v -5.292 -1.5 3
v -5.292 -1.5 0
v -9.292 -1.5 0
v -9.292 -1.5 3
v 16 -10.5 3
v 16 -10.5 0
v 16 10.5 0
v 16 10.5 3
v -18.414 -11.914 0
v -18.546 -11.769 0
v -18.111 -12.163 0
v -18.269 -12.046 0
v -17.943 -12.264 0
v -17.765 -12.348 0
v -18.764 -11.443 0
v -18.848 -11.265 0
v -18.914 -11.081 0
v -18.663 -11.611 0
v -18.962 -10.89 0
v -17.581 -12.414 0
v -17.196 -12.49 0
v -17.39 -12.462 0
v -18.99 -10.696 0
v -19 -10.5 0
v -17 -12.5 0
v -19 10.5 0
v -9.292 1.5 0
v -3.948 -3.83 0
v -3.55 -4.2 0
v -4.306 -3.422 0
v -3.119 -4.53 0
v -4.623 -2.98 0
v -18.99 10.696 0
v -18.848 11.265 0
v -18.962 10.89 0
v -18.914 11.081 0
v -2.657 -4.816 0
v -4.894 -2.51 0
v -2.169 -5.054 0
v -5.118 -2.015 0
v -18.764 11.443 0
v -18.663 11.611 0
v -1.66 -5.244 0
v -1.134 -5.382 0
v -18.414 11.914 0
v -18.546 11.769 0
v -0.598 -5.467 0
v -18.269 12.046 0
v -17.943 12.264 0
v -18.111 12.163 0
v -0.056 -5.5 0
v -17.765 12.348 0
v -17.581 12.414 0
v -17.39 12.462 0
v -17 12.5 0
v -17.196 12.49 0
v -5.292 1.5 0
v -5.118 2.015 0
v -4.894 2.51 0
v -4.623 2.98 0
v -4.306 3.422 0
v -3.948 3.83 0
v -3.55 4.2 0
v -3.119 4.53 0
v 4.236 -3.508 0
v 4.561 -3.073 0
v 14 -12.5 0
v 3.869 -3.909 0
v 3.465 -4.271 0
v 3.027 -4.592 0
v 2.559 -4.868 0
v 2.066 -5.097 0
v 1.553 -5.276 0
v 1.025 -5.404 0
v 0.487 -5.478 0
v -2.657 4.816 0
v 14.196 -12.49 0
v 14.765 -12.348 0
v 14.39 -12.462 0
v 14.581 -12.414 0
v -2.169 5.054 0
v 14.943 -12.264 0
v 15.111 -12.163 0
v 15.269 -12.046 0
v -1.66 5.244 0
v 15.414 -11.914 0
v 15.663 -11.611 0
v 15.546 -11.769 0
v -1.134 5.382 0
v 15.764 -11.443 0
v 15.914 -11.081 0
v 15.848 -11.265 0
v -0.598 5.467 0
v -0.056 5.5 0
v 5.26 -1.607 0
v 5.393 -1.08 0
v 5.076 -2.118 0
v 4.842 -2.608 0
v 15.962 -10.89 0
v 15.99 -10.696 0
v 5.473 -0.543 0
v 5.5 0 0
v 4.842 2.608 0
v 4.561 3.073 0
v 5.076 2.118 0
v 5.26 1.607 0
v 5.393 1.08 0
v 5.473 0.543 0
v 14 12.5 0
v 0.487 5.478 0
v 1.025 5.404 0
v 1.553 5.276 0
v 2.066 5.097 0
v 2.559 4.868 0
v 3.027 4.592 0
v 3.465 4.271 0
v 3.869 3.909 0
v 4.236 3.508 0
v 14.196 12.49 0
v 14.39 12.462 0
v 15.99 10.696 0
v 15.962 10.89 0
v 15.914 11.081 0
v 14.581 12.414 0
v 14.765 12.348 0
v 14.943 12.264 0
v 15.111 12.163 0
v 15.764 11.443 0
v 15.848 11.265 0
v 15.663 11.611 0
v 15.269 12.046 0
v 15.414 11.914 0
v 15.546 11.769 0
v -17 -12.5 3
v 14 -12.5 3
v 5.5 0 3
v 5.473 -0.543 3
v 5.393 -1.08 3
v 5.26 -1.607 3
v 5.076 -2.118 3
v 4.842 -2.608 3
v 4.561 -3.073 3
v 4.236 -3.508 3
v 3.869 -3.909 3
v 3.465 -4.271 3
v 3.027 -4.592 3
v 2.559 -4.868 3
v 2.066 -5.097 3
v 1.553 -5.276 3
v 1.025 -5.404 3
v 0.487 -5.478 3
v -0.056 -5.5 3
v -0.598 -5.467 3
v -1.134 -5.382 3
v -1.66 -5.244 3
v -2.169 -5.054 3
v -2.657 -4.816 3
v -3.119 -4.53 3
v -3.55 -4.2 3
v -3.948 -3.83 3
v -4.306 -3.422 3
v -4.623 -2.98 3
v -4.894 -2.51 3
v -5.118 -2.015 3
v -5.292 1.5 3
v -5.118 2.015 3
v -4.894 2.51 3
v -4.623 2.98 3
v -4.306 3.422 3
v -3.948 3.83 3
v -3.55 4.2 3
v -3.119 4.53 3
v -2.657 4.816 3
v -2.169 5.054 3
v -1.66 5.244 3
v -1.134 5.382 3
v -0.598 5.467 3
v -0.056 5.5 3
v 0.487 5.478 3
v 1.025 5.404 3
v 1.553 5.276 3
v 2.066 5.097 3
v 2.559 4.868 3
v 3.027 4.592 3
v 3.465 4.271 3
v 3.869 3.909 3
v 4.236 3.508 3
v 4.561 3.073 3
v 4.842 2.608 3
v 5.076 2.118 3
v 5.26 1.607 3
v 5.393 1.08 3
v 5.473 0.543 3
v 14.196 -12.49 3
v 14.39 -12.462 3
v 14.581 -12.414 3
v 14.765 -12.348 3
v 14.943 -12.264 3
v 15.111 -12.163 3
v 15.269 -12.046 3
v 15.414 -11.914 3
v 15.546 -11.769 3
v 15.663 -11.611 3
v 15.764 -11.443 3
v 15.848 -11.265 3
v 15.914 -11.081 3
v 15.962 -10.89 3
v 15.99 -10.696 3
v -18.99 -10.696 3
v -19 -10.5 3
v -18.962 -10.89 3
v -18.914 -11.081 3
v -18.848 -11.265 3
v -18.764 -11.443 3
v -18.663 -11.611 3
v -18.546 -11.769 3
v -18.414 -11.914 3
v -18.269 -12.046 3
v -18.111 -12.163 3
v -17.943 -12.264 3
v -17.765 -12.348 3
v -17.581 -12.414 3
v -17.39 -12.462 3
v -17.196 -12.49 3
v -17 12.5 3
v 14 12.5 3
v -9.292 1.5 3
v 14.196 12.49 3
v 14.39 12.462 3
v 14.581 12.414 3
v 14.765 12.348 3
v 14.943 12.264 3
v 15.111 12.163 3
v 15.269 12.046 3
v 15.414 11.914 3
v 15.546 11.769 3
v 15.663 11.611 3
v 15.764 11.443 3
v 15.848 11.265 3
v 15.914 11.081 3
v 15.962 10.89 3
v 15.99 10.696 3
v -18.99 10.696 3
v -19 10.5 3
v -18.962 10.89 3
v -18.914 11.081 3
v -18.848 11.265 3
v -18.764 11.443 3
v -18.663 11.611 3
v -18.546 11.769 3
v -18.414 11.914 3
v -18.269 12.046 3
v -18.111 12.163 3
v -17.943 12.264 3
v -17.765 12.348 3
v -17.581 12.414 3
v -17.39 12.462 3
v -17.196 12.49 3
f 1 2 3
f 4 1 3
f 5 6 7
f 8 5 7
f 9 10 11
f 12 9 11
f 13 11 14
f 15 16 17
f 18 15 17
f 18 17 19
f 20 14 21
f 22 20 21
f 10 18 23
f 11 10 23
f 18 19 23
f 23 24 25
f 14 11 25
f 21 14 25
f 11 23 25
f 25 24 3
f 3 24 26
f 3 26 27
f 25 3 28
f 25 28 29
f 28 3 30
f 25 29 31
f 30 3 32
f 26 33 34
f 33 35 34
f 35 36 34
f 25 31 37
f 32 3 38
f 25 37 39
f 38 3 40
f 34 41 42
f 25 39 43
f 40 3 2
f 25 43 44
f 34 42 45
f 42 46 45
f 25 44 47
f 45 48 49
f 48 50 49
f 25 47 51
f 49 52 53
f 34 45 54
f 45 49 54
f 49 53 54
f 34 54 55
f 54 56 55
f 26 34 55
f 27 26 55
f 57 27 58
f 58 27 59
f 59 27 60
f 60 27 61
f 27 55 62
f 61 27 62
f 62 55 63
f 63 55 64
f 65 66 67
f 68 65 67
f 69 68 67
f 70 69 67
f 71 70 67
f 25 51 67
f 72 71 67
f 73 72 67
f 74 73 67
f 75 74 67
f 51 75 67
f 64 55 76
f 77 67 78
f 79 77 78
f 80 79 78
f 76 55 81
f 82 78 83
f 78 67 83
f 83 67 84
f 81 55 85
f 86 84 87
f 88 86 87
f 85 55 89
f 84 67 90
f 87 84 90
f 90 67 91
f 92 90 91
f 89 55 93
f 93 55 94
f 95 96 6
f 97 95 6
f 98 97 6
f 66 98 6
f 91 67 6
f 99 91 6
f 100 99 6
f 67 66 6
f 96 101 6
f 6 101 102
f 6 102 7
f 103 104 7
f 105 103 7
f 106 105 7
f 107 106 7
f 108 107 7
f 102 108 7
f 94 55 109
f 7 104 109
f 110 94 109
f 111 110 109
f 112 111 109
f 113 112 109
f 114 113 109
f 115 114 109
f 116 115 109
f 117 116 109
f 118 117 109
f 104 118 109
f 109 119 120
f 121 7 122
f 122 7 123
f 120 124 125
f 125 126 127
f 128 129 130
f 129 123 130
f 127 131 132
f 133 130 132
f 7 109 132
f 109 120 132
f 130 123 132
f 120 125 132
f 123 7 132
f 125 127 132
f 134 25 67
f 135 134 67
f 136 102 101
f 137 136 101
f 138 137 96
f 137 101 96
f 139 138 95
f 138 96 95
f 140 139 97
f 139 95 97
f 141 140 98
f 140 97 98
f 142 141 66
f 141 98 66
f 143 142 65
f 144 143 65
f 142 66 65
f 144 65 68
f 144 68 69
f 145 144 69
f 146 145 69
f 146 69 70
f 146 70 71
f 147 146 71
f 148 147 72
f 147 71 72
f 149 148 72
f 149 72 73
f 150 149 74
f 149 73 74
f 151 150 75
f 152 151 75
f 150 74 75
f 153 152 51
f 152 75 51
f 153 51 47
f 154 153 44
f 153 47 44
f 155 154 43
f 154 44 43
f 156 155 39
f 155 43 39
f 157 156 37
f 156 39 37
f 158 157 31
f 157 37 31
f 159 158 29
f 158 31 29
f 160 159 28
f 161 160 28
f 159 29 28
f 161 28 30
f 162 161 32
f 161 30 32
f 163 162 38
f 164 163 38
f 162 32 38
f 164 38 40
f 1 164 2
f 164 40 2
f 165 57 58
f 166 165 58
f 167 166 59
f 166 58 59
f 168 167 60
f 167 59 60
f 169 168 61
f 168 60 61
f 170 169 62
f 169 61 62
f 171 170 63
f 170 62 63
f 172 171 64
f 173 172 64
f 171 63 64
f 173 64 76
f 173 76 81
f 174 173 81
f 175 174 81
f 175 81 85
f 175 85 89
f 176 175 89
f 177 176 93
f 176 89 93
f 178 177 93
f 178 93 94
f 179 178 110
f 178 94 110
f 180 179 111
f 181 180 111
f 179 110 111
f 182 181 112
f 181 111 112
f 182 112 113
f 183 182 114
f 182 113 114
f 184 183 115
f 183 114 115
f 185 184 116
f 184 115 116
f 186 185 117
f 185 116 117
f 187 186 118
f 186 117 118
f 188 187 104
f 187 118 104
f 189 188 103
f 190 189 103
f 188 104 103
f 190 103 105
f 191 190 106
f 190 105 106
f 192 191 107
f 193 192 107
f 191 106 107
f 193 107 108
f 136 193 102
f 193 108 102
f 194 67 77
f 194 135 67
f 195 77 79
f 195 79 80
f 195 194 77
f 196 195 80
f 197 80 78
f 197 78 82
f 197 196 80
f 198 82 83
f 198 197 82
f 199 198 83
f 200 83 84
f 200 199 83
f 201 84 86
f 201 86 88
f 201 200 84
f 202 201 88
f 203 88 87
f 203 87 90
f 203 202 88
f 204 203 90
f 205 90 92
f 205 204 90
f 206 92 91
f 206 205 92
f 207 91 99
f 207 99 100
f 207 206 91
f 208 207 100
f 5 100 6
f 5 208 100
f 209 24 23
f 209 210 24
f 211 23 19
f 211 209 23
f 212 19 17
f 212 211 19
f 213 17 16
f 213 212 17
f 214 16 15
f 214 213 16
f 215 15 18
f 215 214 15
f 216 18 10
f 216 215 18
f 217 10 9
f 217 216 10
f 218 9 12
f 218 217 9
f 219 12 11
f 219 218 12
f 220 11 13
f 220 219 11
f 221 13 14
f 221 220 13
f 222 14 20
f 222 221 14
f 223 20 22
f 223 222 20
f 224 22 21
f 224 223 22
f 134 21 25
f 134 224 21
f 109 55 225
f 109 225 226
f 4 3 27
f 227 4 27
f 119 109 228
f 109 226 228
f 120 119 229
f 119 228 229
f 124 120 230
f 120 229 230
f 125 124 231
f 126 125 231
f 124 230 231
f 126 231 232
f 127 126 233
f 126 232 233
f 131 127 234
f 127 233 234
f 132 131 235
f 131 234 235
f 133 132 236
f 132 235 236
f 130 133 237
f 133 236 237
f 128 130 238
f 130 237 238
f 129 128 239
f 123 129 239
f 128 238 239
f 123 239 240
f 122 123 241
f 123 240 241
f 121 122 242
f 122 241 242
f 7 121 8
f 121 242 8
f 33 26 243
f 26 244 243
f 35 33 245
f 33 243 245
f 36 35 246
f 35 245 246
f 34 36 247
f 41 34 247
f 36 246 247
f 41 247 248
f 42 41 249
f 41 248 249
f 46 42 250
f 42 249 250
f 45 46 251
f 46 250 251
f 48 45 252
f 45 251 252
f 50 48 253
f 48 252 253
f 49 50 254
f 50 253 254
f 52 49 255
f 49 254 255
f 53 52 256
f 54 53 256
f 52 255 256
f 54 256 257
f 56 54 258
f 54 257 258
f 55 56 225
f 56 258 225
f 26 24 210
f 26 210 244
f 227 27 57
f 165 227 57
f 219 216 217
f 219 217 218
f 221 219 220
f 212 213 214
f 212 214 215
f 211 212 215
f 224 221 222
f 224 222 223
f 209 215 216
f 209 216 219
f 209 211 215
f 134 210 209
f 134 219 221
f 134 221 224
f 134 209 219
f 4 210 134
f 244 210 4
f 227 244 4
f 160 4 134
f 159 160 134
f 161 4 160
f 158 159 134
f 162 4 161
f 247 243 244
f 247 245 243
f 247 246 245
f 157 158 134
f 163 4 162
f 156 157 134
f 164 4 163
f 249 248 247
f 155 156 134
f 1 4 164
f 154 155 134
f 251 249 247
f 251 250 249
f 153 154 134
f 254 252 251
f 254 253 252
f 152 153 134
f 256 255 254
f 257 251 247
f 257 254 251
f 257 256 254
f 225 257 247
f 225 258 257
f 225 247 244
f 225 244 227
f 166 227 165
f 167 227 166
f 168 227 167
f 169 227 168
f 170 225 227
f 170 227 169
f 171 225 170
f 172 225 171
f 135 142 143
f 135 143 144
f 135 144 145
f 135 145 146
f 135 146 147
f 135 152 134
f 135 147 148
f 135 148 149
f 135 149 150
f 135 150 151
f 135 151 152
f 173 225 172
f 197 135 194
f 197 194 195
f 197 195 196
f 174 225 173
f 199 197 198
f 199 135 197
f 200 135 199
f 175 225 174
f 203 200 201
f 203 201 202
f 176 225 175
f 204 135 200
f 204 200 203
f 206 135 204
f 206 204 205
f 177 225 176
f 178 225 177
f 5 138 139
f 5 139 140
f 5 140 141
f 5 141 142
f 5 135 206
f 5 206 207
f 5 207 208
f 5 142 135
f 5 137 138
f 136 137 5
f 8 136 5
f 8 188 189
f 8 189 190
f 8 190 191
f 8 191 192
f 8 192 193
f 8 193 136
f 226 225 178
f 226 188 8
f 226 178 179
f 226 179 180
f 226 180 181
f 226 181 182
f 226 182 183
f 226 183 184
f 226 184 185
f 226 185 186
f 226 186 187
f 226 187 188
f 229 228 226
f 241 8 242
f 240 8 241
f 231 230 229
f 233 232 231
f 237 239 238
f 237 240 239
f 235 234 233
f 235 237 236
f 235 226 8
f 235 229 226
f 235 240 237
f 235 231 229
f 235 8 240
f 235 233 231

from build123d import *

# Parameters (mm, degrees)
F0_W     = 35
F0_H     = 25
F1_DEPTH = 3
F2_R     = 2


with BuildPart() as f1:
    # F0 (on Top) → F1 (new body)
    with BuildSketch(Plane.XY):
        with Locations((-1.5, 0)):
            Rectangle(F0_W, F0_H)
        with BuildLine():
            ThreePointArc((-5.291503, 1.5), (0.757211, 5.447626), (5.5, 0))
            ThreePointArc((5.5, 0), (0.757211, -5.447626), (-5.291503, -1.5))
            Line((-5.291503, -1.5), (-9.291503, -1.5))
            Line((-9.291503, -1.5), (-9.291503, 1.5))
            Line((-9.291503, 1.5), (-5.291503, 1.5))
        make_face(mode=Mode.SUBTRACT)
    extrude(amount=F1_DEPTH)

    # F2
    f2_edges = [f1.edges().sort_by_distance(p)[0] for p in [
        (-19, -12.5, 1.5),
        (16, -12.5, 1.5),
        (16, 12.5, 1.5),
        (-19, 12.5, 1.5),
    ]]
    fillet(f2_edges, radius=F2_R)


solid = f1.part
